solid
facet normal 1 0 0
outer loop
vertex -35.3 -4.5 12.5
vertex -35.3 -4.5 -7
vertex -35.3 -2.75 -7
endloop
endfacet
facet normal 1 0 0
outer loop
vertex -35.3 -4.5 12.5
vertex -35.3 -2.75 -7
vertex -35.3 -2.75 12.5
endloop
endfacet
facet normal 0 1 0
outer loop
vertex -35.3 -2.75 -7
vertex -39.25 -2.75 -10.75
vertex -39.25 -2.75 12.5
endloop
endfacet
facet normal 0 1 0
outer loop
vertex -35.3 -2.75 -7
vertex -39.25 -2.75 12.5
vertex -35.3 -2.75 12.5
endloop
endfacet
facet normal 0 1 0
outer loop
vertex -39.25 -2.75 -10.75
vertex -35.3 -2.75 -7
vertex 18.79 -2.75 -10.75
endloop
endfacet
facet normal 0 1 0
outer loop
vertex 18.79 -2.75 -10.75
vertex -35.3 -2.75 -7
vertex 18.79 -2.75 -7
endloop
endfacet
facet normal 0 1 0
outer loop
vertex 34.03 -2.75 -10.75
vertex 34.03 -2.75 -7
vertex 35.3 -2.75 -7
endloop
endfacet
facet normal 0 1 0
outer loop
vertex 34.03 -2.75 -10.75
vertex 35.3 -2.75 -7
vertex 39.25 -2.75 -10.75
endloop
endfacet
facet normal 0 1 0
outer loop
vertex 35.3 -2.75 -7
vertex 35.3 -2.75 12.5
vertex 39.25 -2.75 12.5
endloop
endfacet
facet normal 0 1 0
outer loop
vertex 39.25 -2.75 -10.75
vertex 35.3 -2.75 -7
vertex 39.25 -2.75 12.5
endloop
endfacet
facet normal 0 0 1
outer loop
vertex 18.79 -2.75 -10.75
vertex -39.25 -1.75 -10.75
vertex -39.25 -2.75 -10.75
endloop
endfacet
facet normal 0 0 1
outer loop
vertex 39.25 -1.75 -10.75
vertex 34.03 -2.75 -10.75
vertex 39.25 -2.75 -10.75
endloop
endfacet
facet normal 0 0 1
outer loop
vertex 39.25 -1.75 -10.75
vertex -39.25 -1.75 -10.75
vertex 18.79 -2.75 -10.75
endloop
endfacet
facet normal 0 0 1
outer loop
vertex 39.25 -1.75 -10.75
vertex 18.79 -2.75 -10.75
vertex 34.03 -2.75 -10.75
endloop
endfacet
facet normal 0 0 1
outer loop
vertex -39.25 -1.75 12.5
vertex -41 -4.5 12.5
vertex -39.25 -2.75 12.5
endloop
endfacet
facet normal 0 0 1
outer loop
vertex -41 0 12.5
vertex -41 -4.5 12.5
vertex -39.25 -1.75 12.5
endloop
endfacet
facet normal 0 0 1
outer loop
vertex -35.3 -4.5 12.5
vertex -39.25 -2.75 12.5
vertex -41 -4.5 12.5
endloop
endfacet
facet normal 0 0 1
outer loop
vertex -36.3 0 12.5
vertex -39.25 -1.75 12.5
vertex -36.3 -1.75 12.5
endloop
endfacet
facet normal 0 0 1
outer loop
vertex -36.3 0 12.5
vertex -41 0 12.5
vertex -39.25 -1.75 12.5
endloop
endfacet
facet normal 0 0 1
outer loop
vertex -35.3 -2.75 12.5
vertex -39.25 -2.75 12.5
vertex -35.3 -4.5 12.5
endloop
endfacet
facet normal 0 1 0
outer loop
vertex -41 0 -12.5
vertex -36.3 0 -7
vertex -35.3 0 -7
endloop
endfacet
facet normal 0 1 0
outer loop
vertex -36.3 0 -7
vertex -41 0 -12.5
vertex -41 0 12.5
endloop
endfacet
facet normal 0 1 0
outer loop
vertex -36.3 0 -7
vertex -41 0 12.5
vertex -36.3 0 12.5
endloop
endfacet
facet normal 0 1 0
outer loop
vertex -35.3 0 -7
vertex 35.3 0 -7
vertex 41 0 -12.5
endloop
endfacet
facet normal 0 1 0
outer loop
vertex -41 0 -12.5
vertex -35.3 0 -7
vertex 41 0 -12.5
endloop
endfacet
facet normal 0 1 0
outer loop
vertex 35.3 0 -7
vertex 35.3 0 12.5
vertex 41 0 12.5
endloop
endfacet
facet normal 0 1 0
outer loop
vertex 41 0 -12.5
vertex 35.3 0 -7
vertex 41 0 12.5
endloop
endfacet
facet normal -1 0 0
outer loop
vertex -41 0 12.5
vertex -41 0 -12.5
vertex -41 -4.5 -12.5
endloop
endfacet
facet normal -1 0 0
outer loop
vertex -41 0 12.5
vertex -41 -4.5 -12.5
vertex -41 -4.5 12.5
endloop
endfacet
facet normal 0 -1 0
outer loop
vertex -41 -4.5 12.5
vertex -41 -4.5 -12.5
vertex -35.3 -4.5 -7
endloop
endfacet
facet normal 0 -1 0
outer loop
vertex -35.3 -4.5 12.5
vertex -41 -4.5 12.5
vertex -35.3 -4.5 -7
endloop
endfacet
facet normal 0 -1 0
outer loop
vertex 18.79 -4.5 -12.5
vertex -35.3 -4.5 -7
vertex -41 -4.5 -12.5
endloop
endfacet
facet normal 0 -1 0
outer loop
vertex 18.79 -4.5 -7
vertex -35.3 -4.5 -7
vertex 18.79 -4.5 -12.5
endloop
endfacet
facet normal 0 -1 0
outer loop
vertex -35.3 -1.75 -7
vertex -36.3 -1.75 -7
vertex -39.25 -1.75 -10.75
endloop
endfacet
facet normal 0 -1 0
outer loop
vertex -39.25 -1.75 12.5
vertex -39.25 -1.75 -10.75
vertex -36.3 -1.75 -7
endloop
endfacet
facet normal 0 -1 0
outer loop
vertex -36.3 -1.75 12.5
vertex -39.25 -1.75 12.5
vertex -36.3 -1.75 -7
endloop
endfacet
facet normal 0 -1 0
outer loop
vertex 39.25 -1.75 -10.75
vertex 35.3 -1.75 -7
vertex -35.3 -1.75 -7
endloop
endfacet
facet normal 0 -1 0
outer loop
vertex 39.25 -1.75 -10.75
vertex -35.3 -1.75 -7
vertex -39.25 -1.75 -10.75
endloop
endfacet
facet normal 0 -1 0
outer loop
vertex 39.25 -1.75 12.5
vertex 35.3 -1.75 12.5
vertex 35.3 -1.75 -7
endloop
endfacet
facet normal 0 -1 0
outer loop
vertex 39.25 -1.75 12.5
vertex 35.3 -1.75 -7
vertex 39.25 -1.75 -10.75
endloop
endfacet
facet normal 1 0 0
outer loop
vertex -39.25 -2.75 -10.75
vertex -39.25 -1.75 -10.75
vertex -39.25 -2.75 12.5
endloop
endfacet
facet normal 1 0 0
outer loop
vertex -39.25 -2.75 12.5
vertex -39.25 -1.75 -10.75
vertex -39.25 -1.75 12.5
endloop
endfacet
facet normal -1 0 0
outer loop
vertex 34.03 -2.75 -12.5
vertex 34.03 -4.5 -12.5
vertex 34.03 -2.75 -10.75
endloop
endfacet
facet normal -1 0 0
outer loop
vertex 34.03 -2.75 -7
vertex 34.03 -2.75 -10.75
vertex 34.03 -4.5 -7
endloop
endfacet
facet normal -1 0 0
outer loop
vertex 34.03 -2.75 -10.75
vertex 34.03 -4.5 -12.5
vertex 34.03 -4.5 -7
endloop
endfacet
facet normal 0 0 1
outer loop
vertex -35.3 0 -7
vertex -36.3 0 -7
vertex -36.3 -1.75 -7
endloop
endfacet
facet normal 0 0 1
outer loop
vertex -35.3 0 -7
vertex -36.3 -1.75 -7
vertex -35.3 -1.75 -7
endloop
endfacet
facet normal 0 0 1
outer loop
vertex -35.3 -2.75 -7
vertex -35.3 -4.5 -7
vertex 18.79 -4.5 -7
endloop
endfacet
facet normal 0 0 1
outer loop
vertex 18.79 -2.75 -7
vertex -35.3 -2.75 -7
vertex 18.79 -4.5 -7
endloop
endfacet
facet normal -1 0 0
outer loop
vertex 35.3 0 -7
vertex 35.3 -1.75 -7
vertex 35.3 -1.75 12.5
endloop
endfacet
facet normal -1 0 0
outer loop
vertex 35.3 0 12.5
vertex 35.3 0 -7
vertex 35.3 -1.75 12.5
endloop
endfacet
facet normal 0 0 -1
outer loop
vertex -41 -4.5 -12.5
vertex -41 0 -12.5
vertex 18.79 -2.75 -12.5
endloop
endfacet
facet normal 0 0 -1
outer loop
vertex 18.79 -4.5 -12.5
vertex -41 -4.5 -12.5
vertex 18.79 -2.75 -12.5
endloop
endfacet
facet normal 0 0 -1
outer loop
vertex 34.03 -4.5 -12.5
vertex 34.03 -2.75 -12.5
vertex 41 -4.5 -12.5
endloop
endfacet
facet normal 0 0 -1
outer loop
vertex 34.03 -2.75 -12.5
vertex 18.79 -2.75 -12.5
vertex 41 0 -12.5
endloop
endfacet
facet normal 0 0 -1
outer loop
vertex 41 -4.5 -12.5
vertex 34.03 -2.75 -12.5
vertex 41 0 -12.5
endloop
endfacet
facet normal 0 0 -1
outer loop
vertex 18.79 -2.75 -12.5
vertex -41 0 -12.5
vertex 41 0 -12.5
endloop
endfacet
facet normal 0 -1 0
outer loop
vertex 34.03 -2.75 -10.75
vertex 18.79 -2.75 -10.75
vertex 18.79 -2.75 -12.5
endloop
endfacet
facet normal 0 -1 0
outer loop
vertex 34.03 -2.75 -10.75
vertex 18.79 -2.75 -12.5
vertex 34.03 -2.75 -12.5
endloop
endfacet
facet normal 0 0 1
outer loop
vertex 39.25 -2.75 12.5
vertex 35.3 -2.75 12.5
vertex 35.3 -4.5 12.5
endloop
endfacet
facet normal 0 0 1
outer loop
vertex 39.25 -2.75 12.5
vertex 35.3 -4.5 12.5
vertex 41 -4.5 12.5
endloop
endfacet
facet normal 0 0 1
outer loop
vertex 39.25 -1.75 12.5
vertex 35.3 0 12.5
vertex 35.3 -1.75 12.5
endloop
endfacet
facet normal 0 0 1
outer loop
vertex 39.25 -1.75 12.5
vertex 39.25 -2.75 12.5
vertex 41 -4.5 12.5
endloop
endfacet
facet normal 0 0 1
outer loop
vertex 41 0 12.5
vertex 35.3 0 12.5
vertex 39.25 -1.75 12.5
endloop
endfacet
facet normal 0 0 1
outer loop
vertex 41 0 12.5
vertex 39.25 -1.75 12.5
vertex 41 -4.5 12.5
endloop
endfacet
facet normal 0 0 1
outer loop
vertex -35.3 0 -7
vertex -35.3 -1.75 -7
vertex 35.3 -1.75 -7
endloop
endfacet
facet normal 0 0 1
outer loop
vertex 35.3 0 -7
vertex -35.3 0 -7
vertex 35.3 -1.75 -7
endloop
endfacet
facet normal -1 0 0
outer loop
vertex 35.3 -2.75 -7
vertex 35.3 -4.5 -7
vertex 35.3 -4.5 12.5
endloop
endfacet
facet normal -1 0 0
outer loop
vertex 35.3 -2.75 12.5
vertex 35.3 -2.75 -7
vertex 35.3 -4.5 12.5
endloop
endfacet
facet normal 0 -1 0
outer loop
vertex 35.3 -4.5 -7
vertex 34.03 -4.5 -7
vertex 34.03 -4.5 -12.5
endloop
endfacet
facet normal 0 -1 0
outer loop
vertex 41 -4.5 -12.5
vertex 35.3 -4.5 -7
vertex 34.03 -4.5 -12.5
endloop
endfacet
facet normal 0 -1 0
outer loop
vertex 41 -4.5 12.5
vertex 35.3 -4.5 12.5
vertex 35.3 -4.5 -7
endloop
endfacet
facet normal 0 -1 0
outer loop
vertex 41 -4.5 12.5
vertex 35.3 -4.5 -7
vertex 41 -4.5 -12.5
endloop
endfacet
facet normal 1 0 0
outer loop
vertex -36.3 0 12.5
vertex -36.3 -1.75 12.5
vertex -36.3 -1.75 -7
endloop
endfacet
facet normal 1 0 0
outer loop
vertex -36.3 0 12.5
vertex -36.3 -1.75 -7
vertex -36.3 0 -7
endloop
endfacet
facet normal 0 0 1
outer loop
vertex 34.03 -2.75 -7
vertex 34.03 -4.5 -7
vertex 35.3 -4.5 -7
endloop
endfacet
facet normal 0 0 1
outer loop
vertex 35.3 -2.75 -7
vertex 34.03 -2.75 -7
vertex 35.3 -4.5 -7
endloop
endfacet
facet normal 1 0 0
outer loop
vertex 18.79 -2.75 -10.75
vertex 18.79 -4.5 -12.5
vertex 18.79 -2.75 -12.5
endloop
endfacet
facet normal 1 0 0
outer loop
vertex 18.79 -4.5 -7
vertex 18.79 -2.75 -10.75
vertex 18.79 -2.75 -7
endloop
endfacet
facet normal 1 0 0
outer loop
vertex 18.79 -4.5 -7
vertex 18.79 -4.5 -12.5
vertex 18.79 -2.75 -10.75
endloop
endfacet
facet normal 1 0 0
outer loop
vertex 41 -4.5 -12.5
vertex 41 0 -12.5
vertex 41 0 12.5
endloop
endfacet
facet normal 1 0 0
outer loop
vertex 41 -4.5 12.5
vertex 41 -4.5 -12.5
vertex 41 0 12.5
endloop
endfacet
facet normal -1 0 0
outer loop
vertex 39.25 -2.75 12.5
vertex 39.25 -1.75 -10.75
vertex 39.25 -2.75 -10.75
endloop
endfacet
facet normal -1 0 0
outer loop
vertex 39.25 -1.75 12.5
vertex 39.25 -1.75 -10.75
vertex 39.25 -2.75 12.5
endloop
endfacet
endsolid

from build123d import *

# Parameters (mm, degrees)
F0_W     = 82
F0_H     = 25
F1_DEPTH = 4.5
F2_T     = -1.75
F3_W     = 70.6
F3_H     = 19.5
F4_DEPTH = 50.8
F5_W     = 1
F5_H     = 1.75
F6_DEPTH = 19.49958
F7_W     = 15.24
F7_H     = 5.5
F8_DEPTH = 1.75006


with BuildPart() as f1:
    # F0 (on Front) → F1 (new body)
    with BuildSketch(Plane.XZ):
        Rectangle(F0_W, F0_H)
    extrude(amount=F1_DEPTH)

    # F2
    f2_openings = [f1.faces().sort_by_distance(p)[0] for p in [
        (0, -2.25, 12.5),
    ]]
    offset(amount=F2_T, openings=f2_openings)

    # F3 (on face) → F4 (cut)
    with BuildSketch(Plane.XZ.offset(4.5)):
        with Locations((0, 2.75)):
            Rectangle(F3_W, F3_H)
    extrude(amount=-F4_DEPTH, mode=Mode.SUBTRACT)

    # F5 (on face) → F6 (cut)
    with BuildSketch(Plane.XY.offset(12.5)):
        with Locations((-35.8, -0.875)):
            Rectangle(F5_W, F5_H)
    extrude(amount=-F6_DEPTH, mode=Mode.SUBTRACT)

    # F7 (on face) → F8 (cut)
    with BuildSketch(Plane.XZ.offset(4.5)):
        with Locations((26.41, -9.75)):
            Rectangle(F7_W, F7_H)
    extrude(amount=-F8_DEPTH, mode=Mode.SUBTRACT)


solid = f1.part
